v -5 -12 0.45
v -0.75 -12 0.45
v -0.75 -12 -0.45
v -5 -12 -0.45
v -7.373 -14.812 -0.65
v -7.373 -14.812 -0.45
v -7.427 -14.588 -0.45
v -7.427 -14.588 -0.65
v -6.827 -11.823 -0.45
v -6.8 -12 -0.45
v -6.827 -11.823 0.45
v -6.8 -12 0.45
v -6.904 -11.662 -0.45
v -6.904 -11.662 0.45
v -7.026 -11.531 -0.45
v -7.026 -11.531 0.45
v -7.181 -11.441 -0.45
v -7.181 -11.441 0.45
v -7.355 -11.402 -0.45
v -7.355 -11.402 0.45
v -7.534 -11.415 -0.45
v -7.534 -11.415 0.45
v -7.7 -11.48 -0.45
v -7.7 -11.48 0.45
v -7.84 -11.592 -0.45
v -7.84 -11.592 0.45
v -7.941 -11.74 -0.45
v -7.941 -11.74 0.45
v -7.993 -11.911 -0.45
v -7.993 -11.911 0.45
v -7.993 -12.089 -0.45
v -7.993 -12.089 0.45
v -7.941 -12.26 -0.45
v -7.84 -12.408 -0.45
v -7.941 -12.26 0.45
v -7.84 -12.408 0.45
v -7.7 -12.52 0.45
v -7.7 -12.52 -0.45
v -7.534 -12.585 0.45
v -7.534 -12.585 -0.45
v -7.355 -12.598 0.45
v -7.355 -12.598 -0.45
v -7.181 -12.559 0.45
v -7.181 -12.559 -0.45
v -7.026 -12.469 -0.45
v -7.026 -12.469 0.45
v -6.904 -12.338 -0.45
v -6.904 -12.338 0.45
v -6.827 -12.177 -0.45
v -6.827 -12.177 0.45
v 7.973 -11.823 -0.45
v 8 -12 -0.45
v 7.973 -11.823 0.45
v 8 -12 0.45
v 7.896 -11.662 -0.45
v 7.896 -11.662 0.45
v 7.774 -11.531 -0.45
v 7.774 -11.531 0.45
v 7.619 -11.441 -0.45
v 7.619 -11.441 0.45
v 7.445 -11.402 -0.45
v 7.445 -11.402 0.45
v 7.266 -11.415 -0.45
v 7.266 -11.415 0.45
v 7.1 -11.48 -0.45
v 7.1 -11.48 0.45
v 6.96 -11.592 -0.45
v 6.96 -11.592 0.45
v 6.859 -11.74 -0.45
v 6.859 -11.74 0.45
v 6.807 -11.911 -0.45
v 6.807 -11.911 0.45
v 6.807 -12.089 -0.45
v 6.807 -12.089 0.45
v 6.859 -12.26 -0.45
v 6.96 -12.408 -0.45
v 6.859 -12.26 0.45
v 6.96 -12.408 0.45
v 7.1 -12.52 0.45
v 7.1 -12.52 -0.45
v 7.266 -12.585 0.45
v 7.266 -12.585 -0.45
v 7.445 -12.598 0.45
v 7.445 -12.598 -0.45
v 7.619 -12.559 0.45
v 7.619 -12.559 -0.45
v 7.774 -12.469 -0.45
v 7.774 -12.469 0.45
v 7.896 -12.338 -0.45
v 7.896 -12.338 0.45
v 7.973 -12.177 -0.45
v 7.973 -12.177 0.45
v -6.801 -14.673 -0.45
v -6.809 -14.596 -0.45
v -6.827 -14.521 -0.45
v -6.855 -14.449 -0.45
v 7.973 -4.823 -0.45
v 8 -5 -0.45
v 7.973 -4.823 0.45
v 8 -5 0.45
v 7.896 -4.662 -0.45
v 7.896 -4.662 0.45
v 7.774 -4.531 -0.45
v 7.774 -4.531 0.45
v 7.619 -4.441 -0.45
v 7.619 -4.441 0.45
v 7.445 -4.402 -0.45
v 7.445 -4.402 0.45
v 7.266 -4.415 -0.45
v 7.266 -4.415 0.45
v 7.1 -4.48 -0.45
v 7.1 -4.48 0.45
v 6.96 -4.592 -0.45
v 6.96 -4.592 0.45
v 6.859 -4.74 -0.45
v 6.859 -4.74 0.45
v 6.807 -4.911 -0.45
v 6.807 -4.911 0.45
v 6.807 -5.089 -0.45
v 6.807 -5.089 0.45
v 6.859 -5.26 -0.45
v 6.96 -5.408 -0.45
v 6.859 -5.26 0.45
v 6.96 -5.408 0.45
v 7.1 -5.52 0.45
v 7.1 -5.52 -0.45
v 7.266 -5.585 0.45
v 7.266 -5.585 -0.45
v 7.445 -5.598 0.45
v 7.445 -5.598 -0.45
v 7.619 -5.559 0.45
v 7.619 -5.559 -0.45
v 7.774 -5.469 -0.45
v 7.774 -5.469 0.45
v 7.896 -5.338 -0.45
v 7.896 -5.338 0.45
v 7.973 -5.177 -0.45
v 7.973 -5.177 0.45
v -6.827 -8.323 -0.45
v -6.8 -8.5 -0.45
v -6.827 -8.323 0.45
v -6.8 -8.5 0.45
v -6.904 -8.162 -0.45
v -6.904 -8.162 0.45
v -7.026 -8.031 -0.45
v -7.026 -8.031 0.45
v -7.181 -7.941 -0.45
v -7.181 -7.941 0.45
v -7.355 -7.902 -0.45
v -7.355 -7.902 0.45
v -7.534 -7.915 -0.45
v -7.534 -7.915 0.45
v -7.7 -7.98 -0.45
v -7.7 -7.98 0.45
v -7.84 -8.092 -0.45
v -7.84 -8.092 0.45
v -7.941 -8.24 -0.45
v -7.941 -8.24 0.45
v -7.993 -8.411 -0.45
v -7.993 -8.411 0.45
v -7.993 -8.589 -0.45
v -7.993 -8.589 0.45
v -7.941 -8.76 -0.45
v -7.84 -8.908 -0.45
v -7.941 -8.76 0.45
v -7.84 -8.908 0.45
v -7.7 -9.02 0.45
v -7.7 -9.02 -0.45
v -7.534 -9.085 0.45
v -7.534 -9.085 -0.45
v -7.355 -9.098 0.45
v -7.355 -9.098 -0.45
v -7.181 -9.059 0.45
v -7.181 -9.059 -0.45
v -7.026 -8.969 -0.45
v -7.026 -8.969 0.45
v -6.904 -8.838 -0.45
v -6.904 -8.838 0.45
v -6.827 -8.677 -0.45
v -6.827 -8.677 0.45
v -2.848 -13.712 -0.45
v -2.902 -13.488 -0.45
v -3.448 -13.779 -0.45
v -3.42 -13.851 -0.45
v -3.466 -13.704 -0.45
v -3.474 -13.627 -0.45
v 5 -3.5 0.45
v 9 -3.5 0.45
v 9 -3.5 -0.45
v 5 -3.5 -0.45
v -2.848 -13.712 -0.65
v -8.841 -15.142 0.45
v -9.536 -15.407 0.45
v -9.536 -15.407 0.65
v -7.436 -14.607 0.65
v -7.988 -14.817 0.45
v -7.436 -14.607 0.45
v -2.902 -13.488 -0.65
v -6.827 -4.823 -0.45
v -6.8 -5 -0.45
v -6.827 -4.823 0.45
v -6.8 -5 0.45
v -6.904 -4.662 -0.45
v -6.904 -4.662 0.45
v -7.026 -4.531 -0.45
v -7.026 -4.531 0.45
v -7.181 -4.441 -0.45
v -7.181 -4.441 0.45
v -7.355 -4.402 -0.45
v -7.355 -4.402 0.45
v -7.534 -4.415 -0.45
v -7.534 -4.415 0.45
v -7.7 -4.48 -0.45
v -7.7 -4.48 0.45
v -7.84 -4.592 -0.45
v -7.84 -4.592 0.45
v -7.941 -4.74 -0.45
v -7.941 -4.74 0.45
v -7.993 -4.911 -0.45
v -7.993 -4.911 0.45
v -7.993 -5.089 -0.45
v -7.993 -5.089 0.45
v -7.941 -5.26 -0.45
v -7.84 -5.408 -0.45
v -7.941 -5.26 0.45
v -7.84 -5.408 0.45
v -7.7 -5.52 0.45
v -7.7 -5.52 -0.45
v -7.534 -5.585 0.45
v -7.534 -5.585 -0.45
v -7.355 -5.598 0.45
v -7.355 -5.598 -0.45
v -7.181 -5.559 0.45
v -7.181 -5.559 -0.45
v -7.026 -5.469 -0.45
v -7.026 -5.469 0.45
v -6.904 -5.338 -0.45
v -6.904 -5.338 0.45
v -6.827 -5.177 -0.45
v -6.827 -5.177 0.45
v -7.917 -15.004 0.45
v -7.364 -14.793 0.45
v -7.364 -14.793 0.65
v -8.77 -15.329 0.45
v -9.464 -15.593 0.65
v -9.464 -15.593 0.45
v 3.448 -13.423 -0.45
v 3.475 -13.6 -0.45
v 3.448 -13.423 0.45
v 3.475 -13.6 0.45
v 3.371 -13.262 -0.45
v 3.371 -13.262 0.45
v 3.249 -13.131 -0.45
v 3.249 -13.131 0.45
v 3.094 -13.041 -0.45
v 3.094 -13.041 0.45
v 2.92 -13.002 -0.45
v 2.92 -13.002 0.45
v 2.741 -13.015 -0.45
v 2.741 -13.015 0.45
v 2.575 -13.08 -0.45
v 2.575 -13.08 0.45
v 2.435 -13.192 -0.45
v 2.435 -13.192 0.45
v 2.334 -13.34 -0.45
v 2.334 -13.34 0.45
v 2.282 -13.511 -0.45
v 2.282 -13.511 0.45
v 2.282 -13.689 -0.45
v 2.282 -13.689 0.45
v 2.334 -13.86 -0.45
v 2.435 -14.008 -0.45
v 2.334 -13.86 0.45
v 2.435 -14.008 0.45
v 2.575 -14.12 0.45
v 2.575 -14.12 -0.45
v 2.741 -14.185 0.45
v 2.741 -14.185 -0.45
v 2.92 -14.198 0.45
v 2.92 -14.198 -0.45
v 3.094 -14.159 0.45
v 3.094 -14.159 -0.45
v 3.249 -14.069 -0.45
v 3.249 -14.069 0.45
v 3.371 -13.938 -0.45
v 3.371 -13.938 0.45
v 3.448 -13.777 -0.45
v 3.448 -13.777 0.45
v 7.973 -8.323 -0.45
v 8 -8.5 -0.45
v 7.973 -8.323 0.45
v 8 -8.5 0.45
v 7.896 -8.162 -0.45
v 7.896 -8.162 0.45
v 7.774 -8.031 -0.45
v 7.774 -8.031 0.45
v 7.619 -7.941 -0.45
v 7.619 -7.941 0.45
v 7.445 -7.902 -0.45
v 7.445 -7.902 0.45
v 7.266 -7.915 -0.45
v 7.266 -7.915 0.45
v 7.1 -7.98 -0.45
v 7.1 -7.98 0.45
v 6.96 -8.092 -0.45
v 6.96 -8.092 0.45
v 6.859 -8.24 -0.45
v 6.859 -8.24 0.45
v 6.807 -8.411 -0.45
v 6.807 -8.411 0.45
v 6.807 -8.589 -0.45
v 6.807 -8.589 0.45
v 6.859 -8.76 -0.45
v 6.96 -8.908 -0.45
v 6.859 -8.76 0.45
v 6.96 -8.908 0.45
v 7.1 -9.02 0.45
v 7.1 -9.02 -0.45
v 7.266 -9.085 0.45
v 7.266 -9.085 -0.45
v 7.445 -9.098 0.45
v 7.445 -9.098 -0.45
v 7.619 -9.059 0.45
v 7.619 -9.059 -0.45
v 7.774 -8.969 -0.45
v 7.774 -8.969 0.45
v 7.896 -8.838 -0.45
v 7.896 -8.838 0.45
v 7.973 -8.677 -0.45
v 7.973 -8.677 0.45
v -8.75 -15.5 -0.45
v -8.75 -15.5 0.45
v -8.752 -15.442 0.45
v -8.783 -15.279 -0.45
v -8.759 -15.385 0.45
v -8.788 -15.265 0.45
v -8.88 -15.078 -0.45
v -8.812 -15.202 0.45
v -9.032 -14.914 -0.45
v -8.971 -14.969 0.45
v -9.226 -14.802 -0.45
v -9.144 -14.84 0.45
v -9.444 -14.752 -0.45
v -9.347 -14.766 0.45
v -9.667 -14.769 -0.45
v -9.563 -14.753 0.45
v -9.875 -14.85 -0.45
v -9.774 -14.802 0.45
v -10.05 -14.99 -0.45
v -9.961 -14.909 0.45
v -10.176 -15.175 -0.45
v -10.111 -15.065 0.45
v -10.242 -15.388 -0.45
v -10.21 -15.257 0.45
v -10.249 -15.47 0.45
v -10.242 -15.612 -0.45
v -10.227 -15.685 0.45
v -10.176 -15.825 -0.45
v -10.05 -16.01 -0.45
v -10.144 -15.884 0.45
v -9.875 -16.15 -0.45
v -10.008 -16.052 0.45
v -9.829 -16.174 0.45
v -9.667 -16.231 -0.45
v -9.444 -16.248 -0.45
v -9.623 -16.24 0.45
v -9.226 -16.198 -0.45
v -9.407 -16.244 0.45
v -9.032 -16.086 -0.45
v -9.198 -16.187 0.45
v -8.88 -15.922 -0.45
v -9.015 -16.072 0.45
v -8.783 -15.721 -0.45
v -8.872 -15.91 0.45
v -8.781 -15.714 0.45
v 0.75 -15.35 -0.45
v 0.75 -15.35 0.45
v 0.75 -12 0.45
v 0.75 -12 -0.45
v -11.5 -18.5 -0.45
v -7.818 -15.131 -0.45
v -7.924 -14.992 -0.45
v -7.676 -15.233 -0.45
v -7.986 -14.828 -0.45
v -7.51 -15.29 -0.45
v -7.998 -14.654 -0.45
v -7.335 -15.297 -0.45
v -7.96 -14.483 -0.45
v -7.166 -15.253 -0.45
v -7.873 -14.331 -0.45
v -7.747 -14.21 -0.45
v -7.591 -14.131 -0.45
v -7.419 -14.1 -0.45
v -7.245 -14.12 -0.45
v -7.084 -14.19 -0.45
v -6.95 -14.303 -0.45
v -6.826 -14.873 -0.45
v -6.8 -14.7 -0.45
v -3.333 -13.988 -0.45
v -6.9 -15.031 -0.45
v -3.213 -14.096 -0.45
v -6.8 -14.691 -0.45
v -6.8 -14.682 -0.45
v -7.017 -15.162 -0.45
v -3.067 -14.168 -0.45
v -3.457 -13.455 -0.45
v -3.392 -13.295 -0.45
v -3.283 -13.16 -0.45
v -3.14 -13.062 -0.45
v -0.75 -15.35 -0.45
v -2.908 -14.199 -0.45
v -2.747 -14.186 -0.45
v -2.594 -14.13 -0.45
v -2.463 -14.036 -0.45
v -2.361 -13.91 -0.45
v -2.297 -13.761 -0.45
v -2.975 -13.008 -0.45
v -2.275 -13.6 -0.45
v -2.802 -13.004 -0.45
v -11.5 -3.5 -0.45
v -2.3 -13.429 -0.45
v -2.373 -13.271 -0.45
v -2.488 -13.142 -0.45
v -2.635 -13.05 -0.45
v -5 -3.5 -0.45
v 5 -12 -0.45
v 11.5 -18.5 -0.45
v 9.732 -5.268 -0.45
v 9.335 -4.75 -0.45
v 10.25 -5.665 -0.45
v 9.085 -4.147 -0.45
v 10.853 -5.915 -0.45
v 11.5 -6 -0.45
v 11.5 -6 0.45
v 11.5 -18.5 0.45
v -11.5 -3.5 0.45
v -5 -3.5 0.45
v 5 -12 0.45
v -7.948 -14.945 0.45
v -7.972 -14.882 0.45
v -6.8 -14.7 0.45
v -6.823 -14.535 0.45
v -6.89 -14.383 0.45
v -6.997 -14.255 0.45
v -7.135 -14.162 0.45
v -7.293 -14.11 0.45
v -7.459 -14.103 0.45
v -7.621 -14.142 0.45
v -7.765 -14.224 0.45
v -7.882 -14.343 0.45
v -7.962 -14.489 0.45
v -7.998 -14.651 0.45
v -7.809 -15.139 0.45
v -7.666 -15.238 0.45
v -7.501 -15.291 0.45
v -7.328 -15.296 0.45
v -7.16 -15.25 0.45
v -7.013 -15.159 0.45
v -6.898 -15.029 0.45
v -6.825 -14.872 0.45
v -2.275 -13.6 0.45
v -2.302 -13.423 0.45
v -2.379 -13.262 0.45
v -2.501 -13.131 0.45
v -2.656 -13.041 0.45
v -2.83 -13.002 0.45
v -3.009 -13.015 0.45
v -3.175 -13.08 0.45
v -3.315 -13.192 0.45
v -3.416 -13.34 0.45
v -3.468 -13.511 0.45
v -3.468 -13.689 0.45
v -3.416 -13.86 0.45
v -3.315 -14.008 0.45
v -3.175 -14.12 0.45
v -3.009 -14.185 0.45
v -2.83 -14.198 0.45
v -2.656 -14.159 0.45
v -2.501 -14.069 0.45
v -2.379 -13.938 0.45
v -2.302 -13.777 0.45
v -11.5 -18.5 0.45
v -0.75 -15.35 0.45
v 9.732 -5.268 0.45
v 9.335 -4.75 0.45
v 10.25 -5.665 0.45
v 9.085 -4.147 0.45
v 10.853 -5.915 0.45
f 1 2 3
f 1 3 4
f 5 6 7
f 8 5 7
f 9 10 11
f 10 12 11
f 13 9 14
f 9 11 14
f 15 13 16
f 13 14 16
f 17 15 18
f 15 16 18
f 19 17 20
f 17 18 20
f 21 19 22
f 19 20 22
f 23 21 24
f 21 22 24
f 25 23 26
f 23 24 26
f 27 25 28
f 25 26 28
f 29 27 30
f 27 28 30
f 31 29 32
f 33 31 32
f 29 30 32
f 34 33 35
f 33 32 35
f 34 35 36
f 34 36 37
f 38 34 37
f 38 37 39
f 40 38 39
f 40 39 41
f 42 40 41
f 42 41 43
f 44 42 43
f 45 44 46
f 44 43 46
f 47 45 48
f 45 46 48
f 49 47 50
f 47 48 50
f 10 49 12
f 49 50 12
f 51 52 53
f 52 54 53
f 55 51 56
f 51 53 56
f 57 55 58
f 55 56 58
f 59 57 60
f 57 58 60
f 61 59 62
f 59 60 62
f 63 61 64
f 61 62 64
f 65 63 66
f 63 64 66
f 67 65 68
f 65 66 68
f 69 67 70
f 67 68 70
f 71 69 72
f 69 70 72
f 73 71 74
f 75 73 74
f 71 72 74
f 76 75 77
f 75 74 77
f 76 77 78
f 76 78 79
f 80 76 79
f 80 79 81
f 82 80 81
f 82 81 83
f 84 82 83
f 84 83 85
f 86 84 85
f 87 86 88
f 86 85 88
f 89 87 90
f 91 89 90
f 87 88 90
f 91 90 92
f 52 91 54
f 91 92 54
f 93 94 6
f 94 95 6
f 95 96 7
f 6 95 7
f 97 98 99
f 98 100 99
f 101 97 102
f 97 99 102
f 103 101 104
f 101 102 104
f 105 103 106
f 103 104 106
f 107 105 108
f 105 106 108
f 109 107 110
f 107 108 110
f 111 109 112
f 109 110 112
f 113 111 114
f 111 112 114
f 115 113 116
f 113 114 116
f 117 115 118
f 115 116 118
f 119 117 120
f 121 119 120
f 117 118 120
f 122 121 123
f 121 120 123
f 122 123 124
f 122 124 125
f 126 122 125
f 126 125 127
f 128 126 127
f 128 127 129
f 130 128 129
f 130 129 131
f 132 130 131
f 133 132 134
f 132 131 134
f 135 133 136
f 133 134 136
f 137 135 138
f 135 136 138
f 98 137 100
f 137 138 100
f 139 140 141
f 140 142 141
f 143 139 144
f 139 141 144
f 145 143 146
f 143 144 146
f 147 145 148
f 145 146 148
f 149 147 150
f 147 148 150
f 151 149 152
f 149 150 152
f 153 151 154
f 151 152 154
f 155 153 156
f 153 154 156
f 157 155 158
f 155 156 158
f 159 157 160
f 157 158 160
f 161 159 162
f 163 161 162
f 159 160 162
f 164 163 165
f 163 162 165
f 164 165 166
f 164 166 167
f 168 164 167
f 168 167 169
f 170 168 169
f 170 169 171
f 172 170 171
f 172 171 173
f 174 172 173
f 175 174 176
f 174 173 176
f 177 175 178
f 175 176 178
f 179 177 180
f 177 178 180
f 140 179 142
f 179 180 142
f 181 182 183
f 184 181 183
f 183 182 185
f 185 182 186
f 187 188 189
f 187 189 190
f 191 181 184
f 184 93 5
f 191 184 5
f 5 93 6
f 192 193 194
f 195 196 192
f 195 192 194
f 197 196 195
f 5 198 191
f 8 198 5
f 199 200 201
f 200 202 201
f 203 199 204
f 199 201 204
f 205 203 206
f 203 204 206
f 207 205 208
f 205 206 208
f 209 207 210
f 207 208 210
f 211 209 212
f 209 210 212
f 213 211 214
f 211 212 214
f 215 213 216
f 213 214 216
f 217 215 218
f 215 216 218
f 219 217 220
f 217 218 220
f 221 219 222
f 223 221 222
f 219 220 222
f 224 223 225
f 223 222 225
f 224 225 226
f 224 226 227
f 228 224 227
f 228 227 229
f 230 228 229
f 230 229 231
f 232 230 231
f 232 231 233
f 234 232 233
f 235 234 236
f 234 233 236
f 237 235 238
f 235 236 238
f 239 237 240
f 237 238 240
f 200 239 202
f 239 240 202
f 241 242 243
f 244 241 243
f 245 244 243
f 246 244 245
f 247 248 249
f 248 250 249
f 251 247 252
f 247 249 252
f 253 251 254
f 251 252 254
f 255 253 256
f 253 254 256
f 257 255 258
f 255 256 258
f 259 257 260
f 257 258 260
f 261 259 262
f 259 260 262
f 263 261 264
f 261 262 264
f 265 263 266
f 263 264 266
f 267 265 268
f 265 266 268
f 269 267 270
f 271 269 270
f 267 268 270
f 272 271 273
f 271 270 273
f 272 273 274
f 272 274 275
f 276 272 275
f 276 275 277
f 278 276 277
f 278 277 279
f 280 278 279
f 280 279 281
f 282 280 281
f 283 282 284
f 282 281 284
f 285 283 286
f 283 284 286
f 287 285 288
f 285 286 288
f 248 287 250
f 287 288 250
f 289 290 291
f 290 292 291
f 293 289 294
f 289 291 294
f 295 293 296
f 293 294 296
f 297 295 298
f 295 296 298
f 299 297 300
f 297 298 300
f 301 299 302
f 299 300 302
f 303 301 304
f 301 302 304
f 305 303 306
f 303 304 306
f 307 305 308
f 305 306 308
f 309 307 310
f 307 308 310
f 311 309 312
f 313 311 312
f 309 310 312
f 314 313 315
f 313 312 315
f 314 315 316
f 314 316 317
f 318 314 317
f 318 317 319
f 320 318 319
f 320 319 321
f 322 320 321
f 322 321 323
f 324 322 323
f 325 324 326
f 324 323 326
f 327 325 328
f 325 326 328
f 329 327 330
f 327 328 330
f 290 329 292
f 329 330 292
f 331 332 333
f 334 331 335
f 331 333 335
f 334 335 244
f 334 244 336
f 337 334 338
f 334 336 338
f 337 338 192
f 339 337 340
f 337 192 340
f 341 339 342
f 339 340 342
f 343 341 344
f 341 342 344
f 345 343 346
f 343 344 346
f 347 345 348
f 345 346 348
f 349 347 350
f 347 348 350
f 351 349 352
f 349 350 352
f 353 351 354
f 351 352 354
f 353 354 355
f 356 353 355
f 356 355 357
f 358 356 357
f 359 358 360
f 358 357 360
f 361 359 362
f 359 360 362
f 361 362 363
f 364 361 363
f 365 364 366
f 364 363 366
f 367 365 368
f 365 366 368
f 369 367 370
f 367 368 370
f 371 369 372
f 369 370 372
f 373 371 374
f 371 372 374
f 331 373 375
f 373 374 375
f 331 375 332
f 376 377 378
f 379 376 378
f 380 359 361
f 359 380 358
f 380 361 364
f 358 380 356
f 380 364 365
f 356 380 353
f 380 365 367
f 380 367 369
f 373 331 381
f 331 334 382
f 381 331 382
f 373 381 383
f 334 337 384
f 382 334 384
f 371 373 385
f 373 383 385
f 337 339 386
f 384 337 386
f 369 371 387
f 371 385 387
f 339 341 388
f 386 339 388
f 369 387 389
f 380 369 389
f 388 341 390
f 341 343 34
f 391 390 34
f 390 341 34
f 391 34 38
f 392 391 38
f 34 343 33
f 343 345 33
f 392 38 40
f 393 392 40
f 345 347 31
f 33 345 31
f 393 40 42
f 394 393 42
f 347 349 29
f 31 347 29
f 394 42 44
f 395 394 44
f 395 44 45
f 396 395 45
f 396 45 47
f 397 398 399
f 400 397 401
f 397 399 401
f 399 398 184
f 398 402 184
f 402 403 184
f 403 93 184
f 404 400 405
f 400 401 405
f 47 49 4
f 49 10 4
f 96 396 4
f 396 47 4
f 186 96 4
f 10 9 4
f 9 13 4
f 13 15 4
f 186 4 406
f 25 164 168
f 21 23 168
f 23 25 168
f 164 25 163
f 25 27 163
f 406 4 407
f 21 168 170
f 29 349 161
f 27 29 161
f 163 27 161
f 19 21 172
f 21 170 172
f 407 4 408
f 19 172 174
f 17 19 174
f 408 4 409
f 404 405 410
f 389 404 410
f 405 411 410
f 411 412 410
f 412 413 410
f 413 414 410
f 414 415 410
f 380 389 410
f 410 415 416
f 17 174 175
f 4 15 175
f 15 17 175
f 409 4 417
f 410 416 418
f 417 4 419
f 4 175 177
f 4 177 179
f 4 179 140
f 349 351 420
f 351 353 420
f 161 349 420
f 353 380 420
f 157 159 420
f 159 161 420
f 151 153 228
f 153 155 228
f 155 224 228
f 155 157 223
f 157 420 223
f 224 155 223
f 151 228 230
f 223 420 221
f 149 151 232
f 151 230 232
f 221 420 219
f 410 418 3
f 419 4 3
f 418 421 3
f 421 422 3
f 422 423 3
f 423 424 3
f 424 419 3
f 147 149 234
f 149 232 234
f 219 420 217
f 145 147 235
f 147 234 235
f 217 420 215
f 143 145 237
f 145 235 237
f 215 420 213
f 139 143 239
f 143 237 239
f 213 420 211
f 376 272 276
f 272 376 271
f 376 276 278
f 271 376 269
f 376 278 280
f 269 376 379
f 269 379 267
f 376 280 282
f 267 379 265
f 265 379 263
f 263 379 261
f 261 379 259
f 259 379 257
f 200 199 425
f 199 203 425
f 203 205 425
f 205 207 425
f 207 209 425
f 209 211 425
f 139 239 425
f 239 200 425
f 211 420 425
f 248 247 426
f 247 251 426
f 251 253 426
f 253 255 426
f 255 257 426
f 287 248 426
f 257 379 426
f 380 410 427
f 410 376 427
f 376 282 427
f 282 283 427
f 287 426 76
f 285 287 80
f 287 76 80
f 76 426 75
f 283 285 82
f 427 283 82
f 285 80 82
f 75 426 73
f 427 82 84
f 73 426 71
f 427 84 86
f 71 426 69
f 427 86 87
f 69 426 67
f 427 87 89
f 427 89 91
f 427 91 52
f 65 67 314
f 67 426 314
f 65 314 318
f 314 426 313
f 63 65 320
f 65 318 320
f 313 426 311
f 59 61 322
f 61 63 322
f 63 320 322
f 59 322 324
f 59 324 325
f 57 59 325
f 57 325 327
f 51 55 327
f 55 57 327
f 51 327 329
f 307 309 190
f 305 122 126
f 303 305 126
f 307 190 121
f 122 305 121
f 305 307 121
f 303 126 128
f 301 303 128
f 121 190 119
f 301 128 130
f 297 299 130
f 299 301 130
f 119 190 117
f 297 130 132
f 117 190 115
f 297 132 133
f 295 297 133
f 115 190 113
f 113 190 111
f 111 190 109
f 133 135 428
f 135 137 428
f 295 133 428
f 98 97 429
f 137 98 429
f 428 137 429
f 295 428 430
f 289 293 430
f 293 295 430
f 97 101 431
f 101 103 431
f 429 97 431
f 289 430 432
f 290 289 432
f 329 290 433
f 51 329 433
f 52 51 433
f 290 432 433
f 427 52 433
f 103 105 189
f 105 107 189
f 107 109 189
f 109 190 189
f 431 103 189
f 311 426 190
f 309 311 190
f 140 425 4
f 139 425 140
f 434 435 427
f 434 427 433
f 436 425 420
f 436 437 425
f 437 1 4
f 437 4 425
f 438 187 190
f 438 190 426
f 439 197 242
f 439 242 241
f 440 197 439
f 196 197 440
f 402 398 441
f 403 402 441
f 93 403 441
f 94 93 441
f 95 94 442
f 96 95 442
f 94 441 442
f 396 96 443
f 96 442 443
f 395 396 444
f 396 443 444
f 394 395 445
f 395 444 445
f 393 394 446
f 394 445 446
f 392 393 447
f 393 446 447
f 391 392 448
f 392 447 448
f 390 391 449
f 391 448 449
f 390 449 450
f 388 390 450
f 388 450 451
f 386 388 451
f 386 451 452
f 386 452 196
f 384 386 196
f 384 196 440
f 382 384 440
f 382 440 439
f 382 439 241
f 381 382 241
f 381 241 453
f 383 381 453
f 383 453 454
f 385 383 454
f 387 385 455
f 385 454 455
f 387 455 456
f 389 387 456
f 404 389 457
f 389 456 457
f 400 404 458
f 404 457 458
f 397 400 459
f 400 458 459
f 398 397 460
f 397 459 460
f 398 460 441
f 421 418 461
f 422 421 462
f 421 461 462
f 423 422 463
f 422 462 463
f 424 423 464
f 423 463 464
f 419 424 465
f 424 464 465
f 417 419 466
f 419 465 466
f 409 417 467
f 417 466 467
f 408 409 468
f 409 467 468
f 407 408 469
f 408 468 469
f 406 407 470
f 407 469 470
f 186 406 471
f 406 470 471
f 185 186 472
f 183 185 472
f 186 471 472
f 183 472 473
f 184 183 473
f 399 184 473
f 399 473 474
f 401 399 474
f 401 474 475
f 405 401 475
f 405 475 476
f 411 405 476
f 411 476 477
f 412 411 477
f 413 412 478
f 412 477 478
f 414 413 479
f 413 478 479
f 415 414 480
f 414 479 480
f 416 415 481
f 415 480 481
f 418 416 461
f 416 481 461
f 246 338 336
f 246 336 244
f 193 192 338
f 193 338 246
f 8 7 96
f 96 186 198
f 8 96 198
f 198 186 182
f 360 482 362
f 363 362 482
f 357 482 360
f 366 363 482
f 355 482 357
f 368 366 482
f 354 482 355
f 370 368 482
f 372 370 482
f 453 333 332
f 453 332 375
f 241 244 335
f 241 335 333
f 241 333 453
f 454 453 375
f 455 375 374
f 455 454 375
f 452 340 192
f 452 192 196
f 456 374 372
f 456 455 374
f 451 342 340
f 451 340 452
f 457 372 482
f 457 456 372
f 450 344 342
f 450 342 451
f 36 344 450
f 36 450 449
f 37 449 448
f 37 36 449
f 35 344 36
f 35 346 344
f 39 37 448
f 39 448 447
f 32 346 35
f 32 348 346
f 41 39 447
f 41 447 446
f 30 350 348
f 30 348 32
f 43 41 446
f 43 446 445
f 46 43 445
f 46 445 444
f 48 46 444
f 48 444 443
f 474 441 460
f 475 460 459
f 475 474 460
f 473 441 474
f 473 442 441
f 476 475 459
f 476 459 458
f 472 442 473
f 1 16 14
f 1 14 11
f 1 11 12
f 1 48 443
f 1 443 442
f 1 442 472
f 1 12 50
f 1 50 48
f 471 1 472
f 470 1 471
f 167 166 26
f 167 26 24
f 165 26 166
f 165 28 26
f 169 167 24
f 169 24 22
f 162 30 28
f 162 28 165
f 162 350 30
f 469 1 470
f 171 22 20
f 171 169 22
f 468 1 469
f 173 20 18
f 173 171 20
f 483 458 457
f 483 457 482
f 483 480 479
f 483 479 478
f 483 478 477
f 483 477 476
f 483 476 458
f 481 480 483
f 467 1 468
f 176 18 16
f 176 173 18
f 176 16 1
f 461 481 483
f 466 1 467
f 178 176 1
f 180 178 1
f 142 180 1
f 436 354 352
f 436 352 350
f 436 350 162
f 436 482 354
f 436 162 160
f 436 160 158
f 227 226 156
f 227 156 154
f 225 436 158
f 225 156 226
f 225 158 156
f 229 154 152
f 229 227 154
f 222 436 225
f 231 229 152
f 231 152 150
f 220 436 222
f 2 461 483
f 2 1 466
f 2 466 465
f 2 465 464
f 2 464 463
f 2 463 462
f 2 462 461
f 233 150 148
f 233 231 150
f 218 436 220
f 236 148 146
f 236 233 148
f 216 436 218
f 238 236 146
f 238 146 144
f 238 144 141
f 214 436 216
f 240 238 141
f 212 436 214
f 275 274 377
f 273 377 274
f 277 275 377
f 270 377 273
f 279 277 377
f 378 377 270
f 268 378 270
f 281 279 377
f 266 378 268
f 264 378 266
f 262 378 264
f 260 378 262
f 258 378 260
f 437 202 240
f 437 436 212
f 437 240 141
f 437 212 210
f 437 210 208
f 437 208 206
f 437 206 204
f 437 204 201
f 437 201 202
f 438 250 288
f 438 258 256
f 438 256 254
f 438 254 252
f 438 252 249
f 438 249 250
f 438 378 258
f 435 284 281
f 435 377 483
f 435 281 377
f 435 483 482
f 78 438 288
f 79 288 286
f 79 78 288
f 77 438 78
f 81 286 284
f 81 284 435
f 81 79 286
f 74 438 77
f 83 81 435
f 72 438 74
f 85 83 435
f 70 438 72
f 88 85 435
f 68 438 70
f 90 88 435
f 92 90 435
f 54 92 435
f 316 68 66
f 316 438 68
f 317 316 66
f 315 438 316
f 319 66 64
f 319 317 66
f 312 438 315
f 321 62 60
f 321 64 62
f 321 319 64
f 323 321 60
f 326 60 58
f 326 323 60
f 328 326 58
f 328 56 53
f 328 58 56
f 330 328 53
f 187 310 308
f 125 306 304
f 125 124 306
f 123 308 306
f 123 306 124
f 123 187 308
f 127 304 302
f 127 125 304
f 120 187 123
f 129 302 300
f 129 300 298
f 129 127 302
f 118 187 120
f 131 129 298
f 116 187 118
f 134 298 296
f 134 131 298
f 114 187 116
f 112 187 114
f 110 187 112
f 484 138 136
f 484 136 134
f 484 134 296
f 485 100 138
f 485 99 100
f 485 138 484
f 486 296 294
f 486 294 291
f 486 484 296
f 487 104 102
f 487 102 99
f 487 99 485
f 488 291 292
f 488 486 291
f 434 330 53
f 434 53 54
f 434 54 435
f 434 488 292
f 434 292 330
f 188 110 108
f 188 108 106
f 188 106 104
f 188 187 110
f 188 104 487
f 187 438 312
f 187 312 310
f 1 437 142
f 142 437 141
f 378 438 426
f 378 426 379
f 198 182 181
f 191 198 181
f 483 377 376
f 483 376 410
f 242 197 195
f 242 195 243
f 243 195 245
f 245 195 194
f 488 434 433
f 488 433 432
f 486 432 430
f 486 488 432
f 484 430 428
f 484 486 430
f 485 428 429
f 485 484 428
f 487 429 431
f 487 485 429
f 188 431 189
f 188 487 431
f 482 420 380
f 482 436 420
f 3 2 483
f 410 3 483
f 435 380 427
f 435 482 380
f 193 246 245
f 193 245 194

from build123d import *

# Parameters (mm, degrees)
EXTRUDE_1_DEPTH     = 0.45
CUT_EXTRUDE_1_DEPTH = 5
SKETCH_4_R          = 0.75
SKETCH_4_R_2        = 0.6
CUT_EXTRUDE_3_DEPTH = 5
EXTRUDE_1_2_DEPTH   = 0.2
EXTRUDE_2_DEPTH     = 0.2


with BuildPart() as part:
    # Эскиз1 → Extrude 1 (new, symmetric)
    with BuildSketch(Plane.XY):
        with BuildLine():
            Line((-11.5, -18.5), (11.5, -18.5))
            Line((11.5, -18.5), (11.5, -6))
            ThreePointArc((11.5, -6), (9.732233047, -5.267766953), (9, -3.5))
            Line((9, -3.5), (5, -3.5))
            Line((5, -3.5), (5, -12))
            Line((5, -12), (-5, -12))
            Line((-5, -12), (-5, -3.5))
            Line((-5, -3.5), (-9, -3.5))
            Line((-9, -3.5), (-11.5, -3.5))
            Line((-11.5, -3.5), (-11.5, -6))
            Line((-11.5, -6), (-11.5, -18.5))
        make_face()
    extrude(amount=EXTRUDE_1_DEPTH, both=True)

    # Эскиз2 → Вырез-Вытянуть1 (cut, symmetric)
    with BuildSketch(Plane.XY):
        Polygon((-0.75, -15.25), (-0.75, -12), (0.75, -12), (0.75, -15.25), (0.75, -15.35), (-0.75, -15.35), align=None)
    extrude(amount=CUT_EXTRUDE_1_DEPTH, both=True, mode=Mode.SUBTRACT)

    # Эскиз4 → Вырез-Вытянуть3 (cut, symmetric)
    with BuildSketch(Plane.XY):
        with Locations((-9.5, -15.5)):
            Circle(SKETCH_4_R)
        with Locations((-2.875, -13.6)):
            Circle(SKETCH_4_R_2)
        with Locations((-7.4, -14.7)):
            Circle(SKETCH_4_R_2)
        with Locations((-7.4, -8.5)):
            Circle(SKETCH_4_R_2)
        with Locations((-7.4, -5)):
            Circle(SKETCH_4_R_2)
        with Locations((7.4, -8.5)):
            Circle(SKETCH_4_R_2)
        with Locations((7.4, -5)):
            Circle(SKETCH_4_R_2)
        with Locations((2.875, -13.6)):
            Circle(SKETCH_4_R_2)
        with Locations((-7.4, -12)):
            Circle(SKETCH_4_R_2)
        with Locations((7.4, -12)):
            Circle(SKETCH_4_R_2)
    extrude(amount=CUT_EXTRUDE_3_DEPTH, both=True, mode=Mode.SUBTRACT)

    # Эскиз5 → Extrude 1 2 (add)
    with BuildSketch(Plane(origin=(0, 0, 0.45), x_dir=(-1, 0, 0), z_dir=(0, 0, -1))):
        Polygon((9.535599533, -15.406551227), (7.435599533, -14.606551227), (7.364400467, -14.793448773), (9.464400467, -15.593448773), align=None)
    extrude(amount=-EXTRUDE_1_2_DEPTH)

    # Эскиз6 → Вытянуть-Тонкостенный2 (add)
    with BuildSketch(Plane(origin=(0, 0, -0.45), x_dir=(-1, 0, 0), z_dir=(0, 0, -1))):
        Polygon((2.847835322, -13.711745605), (7.372835322, -14.811745605), (7.427164678, -14.588254395), (2.902164678, -13.488254395), align=None)
    extrude(amount=EXTRUDE_2_DEPTH)


solid = part.part
